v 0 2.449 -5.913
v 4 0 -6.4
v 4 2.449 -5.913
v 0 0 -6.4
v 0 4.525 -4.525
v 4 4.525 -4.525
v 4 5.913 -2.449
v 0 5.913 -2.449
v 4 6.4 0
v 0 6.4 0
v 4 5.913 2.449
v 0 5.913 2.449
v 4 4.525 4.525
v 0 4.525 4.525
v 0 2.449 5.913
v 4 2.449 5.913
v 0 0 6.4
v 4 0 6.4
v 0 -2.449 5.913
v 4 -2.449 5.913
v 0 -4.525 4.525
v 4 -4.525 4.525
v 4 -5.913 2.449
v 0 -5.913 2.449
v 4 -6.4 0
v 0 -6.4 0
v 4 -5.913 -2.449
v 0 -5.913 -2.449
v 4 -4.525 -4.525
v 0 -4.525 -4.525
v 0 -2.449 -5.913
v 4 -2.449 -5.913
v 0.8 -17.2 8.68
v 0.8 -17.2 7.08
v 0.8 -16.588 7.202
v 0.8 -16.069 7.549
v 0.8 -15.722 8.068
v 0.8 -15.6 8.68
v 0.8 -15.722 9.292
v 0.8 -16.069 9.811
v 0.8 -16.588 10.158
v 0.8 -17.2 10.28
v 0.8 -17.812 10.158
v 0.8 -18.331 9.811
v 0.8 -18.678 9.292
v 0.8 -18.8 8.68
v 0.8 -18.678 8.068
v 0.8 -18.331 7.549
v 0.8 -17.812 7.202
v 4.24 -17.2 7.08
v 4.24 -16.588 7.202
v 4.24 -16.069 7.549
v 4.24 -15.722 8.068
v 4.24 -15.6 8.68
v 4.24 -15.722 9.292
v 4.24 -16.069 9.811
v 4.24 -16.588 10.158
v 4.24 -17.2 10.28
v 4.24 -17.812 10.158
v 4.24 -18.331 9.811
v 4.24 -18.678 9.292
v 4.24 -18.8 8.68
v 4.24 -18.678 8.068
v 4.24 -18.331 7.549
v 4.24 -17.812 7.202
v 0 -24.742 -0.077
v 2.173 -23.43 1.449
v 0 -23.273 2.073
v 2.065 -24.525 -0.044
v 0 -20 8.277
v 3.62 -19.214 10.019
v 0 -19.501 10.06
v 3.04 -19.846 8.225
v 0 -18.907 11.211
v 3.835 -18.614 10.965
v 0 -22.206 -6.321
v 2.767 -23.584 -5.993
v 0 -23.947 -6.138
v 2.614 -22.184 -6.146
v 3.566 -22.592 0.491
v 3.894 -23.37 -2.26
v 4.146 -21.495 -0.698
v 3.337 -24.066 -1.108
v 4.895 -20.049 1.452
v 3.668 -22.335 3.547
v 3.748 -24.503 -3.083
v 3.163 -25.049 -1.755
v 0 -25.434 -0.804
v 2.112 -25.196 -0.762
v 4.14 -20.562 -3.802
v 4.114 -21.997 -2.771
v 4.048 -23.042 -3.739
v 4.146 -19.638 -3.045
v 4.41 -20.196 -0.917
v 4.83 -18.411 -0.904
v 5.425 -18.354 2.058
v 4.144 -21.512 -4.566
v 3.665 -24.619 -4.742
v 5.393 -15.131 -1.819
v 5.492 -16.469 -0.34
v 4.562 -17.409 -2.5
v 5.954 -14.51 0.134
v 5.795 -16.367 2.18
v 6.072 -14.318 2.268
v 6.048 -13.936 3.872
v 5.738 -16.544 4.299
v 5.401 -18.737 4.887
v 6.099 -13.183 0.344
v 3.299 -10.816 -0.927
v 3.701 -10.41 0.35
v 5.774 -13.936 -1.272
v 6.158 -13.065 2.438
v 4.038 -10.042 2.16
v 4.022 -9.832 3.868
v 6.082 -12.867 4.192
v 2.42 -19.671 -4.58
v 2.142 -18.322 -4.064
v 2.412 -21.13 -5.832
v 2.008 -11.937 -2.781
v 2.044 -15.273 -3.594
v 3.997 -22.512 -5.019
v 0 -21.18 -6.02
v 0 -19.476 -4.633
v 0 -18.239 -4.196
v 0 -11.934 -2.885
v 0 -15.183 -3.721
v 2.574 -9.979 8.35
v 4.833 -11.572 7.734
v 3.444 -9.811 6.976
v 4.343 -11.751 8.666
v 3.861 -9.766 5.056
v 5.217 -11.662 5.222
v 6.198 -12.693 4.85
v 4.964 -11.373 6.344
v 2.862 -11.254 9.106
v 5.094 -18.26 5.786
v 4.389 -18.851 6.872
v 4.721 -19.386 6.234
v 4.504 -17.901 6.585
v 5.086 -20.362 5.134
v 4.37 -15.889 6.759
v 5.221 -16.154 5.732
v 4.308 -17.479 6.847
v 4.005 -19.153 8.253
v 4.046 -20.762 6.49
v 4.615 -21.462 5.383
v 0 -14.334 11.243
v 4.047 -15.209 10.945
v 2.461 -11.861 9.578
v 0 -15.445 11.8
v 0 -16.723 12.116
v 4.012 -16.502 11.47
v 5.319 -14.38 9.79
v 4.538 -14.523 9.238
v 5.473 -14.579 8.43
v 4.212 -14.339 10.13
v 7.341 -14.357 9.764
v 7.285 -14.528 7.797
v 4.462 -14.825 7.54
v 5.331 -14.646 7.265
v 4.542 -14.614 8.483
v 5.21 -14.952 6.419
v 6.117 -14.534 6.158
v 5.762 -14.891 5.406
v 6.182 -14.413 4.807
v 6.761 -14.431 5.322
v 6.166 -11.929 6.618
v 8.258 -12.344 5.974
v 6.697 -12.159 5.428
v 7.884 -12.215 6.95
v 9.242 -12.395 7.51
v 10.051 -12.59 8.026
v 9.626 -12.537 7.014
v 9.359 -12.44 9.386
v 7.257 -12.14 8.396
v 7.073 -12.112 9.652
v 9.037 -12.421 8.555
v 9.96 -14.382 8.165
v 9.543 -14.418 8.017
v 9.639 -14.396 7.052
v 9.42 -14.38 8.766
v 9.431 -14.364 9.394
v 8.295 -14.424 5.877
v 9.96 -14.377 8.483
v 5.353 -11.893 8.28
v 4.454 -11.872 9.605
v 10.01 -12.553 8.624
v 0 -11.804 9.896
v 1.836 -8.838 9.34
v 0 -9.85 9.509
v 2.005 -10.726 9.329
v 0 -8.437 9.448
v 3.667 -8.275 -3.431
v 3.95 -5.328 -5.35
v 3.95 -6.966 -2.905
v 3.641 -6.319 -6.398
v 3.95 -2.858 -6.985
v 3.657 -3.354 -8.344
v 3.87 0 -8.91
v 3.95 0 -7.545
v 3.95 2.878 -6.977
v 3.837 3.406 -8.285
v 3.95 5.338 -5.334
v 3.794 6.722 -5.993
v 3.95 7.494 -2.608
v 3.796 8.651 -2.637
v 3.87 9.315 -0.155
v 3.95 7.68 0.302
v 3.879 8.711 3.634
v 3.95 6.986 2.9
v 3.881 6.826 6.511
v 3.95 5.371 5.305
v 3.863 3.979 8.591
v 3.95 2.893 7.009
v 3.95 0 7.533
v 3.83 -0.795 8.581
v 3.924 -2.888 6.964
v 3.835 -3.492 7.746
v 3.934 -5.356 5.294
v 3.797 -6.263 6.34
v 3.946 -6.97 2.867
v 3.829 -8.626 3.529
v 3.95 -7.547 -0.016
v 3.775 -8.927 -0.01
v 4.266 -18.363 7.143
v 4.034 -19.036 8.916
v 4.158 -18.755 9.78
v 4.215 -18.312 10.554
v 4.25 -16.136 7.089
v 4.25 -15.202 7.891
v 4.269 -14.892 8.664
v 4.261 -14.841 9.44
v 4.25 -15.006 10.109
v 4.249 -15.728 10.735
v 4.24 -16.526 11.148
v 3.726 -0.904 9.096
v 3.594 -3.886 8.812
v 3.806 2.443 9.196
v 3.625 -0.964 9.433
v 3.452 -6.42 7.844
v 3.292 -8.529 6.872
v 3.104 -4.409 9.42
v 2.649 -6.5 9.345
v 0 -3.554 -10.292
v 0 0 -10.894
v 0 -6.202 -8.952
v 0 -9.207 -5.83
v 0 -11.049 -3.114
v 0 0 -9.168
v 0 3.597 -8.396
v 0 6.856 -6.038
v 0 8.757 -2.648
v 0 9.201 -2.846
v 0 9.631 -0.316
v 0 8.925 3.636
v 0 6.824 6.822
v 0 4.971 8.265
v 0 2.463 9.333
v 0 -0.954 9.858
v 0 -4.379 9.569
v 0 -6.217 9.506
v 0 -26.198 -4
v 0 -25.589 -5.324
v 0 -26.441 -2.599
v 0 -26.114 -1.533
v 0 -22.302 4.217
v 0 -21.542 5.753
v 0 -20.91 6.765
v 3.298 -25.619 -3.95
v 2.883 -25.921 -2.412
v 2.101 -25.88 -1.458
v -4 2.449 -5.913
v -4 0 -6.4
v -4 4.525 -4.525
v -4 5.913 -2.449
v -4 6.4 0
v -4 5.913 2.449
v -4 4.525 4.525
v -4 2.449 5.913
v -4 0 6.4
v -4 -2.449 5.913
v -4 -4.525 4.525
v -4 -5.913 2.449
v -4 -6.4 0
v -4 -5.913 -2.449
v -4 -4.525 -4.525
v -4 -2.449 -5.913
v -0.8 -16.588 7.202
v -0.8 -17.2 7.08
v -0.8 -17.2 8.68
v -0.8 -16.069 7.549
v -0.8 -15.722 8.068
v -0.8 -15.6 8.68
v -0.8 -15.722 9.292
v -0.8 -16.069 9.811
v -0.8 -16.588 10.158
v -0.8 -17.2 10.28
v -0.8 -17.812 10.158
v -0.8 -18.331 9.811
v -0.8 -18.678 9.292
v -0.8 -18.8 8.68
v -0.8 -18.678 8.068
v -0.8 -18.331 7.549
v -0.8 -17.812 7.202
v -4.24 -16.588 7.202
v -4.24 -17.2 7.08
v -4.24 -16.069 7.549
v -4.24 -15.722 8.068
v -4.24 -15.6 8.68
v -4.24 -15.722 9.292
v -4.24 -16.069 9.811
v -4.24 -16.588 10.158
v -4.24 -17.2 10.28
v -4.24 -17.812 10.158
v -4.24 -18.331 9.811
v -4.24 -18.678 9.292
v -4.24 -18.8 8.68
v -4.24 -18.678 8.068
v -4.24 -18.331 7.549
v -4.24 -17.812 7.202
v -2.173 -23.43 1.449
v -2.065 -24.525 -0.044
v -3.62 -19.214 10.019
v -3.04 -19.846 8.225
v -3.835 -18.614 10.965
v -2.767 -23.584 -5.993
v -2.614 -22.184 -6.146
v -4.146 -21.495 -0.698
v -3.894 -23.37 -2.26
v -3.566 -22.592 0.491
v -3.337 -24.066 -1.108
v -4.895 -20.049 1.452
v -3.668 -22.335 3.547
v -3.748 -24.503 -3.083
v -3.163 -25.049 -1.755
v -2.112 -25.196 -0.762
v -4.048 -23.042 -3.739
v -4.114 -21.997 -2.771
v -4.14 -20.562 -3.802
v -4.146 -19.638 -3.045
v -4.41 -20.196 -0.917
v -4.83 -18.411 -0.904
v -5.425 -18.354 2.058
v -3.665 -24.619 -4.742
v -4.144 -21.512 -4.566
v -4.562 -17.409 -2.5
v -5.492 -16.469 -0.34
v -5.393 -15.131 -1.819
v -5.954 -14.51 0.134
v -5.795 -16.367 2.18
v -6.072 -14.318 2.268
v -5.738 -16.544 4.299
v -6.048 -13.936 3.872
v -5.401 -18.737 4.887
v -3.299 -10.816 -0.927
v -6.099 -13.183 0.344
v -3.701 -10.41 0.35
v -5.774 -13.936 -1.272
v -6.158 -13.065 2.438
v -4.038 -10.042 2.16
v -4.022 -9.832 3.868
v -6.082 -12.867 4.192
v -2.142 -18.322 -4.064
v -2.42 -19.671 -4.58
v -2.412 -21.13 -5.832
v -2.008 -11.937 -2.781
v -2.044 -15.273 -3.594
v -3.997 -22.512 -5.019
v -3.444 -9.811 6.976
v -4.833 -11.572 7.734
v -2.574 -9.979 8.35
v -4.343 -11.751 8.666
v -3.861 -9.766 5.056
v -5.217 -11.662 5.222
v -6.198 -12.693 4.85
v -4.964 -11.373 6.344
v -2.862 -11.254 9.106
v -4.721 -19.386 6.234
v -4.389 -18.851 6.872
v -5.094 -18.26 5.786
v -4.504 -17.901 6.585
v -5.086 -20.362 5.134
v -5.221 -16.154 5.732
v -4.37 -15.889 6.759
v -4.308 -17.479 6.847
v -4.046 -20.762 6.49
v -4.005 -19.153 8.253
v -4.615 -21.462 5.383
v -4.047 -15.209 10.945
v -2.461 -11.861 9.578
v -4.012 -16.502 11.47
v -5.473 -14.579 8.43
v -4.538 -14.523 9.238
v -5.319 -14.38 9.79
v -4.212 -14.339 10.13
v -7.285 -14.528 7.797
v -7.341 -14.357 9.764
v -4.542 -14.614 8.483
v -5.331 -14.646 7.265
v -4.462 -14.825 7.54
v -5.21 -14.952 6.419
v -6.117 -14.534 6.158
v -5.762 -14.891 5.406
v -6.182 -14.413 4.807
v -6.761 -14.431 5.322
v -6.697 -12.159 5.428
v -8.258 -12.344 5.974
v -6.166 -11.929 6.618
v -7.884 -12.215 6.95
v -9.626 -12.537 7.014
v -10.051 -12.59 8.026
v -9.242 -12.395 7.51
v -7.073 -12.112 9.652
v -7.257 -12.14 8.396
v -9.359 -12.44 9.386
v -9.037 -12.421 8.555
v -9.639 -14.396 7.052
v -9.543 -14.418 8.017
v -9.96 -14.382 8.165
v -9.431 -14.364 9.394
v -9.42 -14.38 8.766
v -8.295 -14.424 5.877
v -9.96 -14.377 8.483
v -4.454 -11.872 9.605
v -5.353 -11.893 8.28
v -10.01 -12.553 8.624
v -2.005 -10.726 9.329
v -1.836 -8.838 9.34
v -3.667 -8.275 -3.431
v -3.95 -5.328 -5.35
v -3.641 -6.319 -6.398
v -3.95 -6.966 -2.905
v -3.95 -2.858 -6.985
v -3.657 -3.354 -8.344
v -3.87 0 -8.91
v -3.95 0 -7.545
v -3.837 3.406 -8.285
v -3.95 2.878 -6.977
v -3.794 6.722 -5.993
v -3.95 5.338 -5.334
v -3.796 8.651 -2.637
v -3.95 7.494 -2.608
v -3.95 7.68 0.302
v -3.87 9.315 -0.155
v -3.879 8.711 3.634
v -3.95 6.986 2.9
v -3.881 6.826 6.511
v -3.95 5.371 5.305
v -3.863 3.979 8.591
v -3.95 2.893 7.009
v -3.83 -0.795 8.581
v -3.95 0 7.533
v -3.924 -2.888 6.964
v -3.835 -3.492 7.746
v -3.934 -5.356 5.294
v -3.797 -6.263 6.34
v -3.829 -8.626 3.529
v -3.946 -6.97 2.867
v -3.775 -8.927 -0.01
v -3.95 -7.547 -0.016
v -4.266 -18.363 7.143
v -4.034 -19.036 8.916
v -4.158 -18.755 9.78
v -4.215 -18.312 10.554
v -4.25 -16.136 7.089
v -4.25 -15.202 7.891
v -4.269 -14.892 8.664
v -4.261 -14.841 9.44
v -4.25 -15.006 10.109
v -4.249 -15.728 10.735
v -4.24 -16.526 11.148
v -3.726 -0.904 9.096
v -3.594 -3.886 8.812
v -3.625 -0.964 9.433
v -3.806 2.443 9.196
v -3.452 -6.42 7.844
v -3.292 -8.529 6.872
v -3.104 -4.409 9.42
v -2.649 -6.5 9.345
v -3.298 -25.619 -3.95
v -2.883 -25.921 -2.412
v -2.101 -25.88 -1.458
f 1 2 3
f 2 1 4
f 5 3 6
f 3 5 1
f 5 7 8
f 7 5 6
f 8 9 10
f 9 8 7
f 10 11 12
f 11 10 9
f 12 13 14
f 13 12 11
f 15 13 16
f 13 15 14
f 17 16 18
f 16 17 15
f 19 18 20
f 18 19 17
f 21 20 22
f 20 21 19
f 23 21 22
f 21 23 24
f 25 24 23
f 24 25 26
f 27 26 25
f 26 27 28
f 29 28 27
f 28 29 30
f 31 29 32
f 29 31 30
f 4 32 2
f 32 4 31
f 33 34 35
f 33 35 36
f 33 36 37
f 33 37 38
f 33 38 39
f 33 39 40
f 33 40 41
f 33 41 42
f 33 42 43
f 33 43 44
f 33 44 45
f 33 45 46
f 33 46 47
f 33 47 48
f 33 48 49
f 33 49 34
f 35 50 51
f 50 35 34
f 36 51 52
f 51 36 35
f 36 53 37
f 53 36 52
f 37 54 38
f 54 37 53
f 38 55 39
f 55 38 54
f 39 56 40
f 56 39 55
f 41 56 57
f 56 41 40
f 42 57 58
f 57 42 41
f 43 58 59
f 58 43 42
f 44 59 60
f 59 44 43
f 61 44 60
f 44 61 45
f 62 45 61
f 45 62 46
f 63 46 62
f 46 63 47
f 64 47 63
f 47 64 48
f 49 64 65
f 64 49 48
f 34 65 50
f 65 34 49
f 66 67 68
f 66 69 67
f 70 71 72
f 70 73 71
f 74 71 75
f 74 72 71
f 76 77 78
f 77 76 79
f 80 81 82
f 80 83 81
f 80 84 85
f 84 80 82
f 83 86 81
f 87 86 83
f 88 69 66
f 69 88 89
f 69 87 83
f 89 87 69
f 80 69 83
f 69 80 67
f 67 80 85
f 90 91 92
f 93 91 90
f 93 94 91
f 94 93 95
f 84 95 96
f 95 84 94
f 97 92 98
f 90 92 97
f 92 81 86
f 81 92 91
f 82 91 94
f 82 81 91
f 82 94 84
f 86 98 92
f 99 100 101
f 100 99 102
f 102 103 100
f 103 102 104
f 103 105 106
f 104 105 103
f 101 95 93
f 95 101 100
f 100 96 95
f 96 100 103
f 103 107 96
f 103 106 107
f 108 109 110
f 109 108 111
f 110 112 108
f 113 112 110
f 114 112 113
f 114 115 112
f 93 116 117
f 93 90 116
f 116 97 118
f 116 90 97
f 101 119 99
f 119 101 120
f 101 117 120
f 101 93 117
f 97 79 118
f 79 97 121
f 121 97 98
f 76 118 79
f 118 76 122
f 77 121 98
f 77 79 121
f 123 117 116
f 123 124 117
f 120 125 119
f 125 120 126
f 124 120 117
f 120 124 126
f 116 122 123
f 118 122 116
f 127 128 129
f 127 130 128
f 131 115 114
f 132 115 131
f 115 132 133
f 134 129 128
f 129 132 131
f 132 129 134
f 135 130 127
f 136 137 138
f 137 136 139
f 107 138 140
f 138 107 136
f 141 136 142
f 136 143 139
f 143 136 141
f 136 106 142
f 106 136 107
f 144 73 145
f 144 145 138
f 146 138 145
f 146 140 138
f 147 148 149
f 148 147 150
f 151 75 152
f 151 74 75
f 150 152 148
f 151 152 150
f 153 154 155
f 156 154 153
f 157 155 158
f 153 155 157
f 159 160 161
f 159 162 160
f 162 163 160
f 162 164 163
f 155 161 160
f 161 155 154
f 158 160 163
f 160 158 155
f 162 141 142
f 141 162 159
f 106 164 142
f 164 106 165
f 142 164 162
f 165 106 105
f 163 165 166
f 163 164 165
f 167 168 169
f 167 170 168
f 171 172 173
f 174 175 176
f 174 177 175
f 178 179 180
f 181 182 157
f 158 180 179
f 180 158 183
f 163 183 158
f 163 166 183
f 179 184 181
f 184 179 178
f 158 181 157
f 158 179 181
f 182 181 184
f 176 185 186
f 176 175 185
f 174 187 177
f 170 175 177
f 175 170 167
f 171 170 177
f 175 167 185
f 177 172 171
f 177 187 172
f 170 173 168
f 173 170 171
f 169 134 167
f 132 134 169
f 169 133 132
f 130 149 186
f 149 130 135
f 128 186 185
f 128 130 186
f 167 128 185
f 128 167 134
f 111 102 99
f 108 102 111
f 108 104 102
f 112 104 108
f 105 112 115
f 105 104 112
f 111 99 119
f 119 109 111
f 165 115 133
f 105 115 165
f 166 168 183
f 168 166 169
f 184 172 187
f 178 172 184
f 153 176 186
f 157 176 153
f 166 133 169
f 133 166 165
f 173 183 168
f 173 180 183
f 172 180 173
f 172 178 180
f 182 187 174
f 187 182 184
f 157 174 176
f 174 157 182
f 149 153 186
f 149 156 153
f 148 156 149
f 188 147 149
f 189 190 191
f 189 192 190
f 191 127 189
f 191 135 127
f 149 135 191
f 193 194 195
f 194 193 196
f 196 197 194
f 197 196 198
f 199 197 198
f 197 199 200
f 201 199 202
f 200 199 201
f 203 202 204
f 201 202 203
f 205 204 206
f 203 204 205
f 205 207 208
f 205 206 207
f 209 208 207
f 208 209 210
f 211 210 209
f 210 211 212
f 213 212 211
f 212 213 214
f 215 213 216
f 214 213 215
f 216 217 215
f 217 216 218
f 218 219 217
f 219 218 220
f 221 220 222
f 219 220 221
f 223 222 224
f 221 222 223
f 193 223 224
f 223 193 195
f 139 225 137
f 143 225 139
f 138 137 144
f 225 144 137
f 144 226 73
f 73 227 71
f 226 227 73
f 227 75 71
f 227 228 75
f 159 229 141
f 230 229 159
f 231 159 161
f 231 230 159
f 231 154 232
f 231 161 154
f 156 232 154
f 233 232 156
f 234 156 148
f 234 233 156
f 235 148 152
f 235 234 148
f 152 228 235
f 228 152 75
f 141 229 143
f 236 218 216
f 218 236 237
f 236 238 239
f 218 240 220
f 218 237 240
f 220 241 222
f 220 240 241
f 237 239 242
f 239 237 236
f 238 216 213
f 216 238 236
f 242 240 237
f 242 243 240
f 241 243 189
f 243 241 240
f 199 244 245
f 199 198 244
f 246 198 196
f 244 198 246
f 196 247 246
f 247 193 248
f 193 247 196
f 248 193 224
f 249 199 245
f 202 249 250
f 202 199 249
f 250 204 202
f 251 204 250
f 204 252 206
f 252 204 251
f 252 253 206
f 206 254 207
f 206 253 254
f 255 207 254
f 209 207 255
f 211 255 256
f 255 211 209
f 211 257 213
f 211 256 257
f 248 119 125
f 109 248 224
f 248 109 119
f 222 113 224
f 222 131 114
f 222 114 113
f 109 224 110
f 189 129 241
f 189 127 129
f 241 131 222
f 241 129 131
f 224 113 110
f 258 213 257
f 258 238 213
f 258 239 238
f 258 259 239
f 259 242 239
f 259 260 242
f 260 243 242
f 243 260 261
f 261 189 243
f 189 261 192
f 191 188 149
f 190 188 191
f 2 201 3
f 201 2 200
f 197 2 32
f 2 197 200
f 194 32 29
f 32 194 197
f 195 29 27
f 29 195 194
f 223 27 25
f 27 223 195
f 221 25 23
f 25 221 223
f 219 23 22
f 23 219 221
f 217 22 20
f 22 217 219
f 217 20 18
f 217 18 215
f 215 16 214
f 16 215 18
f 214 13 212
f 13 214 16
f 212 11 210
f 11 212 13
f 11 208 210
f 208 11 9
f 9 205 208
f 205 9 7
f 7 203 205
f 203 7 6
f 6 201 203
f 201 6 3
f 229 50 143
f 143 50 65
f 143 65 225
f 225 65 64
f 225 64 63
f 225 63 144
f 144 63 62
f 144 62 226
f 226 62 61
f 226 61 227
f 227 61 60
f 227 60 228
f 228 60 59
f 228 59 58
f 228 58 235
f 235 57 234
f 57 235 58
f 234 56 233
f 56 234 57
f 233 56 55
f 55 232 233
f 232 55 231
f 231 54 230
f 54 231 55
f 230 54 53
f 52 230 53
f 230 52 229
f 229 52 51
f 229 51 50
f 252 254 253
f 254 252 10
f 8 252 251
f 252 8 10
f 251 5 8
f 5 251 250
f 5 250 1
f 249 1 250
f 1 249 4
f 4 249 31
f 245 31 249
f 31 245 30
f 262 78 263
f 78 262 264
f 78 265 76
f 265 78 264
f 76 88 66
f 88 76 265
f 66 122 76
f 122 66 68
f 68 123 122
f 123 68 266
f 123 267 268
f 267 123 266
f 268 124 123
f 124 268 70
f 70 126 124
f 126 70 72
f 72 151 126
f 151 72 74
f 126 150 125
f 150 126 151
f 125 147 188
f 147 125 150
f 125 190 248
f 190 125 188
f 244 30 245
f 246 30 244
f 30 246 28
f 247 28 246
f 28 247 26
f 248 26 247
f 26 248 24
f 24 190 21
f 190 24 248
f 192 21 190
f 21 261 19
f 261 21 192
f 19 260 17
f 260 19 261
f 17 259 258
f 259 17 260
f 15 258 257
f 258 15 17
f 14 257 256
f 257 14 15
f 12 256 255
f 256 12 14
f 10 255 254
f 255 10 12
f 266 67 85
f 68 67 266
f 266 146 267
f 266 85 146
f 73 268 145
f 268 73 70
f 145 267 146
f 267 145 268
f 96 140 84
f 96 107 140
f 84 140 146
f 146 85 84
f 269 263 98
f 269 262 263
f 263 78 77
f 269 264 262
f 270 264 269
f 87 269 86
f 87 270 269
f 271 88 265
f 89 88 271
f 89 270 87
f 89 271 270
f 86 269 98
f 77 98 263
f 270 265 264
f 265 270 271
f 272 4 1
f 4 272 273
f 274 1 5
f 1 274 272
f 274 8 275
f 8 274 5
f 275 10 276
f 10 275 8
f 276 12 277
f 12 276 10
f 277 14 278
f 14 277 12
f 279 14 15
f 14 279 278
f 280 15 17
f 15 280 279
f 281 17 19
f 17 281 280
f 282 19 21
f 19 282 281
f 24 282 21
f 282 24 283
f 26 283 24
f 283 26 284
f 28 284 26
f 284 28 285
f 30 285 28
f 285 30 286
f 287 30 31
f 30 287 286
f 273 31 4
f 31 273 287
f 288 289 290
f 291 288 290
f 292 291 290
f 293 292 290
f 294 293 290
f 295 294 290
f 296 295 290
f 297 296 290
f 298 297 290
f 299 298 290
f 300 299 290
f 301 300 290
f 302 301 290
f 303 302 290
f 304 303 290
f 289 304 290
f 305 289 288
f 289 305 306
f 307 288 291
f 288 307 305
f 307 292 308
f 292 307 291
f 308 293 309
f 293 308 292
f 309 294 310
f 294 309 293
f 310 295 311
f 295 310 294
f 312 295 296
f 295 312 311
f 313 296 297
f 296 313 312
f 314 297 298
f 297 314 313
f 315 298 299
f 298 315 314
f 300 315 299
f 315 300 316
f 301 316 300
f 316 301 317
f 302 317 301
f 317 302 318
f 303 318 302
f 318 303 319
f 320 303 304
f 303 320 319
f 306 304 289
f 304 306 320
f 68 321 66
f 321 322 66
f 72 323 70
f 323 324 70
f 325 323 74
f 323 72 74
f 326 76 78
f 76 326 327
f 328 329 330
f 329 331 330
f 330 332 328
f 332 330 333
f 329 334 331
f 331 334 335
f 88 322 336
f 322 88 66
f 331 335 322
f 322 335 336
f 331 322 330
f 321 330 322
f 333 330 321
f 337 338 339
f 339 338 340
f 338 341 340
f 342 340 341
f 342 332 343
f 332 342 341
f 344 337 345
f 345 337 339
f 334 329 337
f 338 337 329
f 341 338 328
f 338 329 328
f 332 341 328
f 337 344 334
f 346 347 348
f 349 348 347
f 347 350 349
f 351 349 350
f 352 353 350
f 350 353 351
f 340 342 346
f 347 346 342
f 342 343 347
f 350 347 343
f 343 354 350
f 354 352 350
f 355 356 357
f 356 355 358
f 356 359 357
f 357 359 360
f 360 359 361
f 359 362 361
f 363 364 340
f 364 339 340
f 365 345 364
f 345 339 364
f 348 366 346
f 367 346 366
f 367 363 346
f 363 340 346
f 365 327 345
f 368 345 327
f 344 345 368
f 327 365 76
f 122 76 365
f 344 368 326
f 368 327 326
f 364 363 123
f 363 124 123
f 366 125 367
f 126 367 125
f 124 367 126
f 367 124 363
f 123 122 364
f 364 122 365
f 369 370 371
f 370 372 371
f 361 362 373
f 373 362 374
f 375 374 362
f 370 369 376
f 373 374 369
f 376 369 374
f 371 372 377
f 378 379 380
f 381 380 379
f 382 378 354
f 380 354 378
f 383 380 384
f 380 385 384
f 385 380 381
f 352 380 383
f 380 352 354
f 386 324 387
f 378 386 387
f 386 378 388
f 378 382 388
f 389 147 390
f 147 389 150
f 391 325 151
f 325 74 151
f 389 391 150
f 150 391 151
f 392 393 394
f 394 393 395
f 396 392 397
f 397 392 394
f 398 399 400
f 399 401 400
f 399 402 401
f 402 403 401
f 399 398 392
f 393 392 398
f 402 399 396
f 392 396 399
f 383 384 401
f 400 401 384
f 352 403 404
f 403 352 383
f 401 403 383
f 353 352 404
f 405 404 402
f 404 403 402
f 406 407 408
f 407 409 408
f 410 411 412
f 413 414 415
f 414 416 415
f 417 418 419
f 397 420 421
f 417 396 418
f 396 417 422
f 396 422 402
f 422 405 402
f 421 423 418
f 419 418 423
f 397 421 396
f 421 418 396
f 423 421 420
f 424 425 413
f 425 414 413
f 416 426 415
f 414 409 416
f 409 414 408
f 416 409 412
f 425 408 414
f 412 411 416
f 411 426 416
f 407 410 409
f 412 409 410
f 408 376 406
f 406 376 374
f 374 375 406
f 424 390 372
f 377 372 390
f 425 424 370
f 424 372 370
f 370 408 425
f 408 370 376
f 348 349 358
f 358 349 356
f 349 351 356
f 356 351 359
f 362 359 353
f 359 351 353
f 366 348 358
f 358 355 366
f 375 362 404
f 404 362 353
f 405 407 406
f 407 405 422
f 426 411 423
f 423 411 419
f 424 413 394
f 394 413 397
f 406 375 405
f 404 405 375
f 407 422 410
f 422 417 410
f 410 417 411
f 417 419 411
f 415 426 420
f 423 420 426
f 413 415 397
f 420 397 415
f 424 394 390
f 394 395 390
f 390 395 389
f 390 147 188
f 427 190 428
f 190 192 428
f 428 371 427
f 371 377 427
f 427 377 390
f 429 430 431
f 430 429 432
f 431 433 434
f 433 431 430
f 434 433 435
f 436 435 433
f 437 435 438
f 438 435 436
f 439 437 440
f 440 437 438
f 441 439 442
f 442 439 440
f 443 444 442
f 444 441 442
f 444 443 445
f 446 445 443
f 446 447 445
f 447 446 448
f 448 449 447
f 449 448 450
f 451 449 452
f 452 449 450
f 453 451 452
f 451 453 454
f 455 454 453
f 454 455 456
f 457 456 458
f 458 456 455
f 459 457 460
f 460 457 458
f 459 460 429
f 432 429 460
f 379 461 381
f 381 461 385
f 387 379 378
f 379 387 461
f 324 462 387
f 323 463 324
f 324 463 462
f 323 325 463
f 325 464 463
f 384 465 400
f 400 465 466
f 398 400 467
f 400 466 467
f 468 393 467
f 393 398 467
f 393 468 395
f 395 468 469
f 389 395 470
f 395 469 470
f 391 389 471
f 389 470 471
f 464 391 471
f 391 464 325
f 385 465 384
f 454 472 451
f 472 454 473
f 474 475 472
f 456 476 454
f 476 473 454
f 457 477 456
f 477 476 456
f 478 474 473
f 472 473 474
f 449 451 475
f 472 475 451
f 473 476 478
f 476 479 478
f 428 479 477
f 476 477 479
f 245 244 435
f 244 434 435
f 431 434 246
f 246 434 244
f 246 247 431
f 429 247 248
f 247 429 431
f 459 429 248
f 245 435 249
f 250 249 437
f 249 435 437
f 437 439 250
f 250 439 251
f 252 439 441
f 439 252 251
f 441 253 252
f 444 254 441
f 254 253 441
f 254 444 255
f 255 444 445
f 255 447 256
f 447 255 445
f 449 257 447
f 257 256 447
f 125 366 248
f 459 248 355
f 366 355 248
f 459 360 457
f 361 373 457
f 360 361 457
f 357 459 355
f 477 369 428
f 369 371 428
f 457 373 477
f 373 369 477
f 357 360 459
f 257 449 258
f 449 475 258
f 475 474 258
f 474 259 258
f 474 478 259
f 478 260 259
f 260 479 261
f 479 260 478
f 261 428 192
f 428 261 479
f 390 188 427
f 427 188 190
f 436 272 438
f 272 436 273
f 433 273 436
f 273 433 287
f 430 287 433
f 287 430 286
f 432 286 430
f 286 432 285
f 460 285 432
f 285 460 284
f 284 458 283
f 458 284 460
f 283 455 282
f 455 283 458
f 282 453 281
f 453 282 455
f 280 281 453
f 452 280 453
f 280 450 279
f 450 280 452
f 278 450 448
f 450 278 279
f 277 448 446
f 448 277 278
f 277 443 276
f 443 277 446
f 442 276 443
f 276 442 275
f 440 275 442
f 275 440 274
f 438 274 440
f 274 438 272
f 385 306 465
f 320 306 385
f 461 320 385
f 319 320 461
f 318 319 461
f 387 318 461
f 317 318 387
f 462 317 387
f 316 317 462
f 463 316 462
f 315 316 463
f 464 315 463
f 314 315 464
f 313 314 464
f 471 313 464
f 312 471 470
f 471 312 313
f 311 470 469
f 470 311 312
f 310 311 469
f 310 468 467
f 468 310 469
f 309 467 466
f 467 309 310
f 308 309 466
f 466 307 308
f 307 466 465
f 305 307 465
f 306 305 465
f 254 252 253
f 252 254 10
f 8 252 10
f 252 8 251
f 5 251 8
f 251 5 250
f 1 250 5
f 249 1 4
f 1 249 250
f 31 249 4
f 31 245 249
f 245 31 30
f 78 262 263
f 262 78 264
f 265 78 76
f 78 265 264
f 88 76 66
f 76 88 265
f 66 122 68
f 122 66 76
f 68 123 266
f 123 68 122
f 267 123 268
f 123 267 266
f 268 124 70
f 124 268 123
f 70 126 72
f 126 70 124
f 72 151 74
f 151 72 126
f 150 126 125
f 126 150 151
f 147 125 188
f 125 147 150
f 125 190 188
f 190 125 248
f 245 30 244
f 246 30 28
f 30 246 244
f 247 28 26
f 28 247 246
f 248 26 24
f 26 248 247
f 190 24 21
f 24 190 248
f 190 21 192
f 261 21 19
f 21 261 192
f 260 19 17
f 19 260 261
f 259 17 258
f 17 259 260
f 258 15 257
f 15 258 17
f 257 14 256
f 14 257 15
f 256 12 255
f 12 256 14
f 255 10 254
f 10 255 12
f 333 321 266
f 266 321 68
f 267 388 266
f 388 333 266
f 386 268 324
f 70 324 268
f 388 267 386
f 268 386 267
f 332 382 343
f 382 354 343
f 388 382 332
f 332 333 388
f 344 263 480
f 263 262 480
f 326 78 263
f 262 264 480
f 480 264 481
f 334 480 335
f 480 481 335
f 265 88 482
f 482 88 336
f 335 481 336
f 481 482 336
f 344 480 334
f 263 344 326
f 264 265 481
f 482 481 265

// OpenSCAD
use <../lib.scad>
use <64780.scad>
use <64835.scad>
$fa=1; $fs=0.2;
function ldraw_lib__64835c01(realsolid=false) = [
// 0 Animal Cow Head
// 0 Name: 64835c01.dat
// 0 Author: Philippe Hurbain [Philo]
// 0 !LDRAW_ORG Shortcut UPDATE 2015-01
// 0 !LICENSE Licensed under CC BY 2.0 and CC BY 4.0 : see CAreadme.txt
// 
// 0 !HELP Horns coordinates: X=+/-10.6, Y=-21.7 , Z=-43
// 
// 0 BFC CERTIFY CCW
  [0,"BFC","CERTIFY"],
  [0,"BFC","CCW"],
// 
// 0 !HISTORY 2013-12-19 {LEGO Digital Designer} Original part shape
// 0 !HISTORY 2013-12-19 [Philo] File preparation for LDraw Parts Tracker
// 0 !HISTORY 2015-10-11 [PTadmin] Official Update 2015-01
// 
// 
// 1 16 0 0 0 1 0 0 0 1 0 0 0 1 64835.dat
  [1,16,0,0,0,1,0,0,0,1,0,0,0,1, ldraw_lib__64835(realsolid)],
// 1 16 0 0 0 1 0 0 0 1 0 0 0 1 64780.dat
  [1,16,0,0,0,1,0,0,0,1,0,0,0,1, ldraw_lib__64780(realsolid)],
];
module ldraw_lib__64835c01(step=0, col=false, unit=2/5, alt=false, line=0.2, solid=!$preview)
    makepoly(ldraw_lib__64835c01(solid), step=step, col=col, unit=unit, alt=alt, line=line, solid=solid);
ldraw_lib__64835c01(line=0.2);
